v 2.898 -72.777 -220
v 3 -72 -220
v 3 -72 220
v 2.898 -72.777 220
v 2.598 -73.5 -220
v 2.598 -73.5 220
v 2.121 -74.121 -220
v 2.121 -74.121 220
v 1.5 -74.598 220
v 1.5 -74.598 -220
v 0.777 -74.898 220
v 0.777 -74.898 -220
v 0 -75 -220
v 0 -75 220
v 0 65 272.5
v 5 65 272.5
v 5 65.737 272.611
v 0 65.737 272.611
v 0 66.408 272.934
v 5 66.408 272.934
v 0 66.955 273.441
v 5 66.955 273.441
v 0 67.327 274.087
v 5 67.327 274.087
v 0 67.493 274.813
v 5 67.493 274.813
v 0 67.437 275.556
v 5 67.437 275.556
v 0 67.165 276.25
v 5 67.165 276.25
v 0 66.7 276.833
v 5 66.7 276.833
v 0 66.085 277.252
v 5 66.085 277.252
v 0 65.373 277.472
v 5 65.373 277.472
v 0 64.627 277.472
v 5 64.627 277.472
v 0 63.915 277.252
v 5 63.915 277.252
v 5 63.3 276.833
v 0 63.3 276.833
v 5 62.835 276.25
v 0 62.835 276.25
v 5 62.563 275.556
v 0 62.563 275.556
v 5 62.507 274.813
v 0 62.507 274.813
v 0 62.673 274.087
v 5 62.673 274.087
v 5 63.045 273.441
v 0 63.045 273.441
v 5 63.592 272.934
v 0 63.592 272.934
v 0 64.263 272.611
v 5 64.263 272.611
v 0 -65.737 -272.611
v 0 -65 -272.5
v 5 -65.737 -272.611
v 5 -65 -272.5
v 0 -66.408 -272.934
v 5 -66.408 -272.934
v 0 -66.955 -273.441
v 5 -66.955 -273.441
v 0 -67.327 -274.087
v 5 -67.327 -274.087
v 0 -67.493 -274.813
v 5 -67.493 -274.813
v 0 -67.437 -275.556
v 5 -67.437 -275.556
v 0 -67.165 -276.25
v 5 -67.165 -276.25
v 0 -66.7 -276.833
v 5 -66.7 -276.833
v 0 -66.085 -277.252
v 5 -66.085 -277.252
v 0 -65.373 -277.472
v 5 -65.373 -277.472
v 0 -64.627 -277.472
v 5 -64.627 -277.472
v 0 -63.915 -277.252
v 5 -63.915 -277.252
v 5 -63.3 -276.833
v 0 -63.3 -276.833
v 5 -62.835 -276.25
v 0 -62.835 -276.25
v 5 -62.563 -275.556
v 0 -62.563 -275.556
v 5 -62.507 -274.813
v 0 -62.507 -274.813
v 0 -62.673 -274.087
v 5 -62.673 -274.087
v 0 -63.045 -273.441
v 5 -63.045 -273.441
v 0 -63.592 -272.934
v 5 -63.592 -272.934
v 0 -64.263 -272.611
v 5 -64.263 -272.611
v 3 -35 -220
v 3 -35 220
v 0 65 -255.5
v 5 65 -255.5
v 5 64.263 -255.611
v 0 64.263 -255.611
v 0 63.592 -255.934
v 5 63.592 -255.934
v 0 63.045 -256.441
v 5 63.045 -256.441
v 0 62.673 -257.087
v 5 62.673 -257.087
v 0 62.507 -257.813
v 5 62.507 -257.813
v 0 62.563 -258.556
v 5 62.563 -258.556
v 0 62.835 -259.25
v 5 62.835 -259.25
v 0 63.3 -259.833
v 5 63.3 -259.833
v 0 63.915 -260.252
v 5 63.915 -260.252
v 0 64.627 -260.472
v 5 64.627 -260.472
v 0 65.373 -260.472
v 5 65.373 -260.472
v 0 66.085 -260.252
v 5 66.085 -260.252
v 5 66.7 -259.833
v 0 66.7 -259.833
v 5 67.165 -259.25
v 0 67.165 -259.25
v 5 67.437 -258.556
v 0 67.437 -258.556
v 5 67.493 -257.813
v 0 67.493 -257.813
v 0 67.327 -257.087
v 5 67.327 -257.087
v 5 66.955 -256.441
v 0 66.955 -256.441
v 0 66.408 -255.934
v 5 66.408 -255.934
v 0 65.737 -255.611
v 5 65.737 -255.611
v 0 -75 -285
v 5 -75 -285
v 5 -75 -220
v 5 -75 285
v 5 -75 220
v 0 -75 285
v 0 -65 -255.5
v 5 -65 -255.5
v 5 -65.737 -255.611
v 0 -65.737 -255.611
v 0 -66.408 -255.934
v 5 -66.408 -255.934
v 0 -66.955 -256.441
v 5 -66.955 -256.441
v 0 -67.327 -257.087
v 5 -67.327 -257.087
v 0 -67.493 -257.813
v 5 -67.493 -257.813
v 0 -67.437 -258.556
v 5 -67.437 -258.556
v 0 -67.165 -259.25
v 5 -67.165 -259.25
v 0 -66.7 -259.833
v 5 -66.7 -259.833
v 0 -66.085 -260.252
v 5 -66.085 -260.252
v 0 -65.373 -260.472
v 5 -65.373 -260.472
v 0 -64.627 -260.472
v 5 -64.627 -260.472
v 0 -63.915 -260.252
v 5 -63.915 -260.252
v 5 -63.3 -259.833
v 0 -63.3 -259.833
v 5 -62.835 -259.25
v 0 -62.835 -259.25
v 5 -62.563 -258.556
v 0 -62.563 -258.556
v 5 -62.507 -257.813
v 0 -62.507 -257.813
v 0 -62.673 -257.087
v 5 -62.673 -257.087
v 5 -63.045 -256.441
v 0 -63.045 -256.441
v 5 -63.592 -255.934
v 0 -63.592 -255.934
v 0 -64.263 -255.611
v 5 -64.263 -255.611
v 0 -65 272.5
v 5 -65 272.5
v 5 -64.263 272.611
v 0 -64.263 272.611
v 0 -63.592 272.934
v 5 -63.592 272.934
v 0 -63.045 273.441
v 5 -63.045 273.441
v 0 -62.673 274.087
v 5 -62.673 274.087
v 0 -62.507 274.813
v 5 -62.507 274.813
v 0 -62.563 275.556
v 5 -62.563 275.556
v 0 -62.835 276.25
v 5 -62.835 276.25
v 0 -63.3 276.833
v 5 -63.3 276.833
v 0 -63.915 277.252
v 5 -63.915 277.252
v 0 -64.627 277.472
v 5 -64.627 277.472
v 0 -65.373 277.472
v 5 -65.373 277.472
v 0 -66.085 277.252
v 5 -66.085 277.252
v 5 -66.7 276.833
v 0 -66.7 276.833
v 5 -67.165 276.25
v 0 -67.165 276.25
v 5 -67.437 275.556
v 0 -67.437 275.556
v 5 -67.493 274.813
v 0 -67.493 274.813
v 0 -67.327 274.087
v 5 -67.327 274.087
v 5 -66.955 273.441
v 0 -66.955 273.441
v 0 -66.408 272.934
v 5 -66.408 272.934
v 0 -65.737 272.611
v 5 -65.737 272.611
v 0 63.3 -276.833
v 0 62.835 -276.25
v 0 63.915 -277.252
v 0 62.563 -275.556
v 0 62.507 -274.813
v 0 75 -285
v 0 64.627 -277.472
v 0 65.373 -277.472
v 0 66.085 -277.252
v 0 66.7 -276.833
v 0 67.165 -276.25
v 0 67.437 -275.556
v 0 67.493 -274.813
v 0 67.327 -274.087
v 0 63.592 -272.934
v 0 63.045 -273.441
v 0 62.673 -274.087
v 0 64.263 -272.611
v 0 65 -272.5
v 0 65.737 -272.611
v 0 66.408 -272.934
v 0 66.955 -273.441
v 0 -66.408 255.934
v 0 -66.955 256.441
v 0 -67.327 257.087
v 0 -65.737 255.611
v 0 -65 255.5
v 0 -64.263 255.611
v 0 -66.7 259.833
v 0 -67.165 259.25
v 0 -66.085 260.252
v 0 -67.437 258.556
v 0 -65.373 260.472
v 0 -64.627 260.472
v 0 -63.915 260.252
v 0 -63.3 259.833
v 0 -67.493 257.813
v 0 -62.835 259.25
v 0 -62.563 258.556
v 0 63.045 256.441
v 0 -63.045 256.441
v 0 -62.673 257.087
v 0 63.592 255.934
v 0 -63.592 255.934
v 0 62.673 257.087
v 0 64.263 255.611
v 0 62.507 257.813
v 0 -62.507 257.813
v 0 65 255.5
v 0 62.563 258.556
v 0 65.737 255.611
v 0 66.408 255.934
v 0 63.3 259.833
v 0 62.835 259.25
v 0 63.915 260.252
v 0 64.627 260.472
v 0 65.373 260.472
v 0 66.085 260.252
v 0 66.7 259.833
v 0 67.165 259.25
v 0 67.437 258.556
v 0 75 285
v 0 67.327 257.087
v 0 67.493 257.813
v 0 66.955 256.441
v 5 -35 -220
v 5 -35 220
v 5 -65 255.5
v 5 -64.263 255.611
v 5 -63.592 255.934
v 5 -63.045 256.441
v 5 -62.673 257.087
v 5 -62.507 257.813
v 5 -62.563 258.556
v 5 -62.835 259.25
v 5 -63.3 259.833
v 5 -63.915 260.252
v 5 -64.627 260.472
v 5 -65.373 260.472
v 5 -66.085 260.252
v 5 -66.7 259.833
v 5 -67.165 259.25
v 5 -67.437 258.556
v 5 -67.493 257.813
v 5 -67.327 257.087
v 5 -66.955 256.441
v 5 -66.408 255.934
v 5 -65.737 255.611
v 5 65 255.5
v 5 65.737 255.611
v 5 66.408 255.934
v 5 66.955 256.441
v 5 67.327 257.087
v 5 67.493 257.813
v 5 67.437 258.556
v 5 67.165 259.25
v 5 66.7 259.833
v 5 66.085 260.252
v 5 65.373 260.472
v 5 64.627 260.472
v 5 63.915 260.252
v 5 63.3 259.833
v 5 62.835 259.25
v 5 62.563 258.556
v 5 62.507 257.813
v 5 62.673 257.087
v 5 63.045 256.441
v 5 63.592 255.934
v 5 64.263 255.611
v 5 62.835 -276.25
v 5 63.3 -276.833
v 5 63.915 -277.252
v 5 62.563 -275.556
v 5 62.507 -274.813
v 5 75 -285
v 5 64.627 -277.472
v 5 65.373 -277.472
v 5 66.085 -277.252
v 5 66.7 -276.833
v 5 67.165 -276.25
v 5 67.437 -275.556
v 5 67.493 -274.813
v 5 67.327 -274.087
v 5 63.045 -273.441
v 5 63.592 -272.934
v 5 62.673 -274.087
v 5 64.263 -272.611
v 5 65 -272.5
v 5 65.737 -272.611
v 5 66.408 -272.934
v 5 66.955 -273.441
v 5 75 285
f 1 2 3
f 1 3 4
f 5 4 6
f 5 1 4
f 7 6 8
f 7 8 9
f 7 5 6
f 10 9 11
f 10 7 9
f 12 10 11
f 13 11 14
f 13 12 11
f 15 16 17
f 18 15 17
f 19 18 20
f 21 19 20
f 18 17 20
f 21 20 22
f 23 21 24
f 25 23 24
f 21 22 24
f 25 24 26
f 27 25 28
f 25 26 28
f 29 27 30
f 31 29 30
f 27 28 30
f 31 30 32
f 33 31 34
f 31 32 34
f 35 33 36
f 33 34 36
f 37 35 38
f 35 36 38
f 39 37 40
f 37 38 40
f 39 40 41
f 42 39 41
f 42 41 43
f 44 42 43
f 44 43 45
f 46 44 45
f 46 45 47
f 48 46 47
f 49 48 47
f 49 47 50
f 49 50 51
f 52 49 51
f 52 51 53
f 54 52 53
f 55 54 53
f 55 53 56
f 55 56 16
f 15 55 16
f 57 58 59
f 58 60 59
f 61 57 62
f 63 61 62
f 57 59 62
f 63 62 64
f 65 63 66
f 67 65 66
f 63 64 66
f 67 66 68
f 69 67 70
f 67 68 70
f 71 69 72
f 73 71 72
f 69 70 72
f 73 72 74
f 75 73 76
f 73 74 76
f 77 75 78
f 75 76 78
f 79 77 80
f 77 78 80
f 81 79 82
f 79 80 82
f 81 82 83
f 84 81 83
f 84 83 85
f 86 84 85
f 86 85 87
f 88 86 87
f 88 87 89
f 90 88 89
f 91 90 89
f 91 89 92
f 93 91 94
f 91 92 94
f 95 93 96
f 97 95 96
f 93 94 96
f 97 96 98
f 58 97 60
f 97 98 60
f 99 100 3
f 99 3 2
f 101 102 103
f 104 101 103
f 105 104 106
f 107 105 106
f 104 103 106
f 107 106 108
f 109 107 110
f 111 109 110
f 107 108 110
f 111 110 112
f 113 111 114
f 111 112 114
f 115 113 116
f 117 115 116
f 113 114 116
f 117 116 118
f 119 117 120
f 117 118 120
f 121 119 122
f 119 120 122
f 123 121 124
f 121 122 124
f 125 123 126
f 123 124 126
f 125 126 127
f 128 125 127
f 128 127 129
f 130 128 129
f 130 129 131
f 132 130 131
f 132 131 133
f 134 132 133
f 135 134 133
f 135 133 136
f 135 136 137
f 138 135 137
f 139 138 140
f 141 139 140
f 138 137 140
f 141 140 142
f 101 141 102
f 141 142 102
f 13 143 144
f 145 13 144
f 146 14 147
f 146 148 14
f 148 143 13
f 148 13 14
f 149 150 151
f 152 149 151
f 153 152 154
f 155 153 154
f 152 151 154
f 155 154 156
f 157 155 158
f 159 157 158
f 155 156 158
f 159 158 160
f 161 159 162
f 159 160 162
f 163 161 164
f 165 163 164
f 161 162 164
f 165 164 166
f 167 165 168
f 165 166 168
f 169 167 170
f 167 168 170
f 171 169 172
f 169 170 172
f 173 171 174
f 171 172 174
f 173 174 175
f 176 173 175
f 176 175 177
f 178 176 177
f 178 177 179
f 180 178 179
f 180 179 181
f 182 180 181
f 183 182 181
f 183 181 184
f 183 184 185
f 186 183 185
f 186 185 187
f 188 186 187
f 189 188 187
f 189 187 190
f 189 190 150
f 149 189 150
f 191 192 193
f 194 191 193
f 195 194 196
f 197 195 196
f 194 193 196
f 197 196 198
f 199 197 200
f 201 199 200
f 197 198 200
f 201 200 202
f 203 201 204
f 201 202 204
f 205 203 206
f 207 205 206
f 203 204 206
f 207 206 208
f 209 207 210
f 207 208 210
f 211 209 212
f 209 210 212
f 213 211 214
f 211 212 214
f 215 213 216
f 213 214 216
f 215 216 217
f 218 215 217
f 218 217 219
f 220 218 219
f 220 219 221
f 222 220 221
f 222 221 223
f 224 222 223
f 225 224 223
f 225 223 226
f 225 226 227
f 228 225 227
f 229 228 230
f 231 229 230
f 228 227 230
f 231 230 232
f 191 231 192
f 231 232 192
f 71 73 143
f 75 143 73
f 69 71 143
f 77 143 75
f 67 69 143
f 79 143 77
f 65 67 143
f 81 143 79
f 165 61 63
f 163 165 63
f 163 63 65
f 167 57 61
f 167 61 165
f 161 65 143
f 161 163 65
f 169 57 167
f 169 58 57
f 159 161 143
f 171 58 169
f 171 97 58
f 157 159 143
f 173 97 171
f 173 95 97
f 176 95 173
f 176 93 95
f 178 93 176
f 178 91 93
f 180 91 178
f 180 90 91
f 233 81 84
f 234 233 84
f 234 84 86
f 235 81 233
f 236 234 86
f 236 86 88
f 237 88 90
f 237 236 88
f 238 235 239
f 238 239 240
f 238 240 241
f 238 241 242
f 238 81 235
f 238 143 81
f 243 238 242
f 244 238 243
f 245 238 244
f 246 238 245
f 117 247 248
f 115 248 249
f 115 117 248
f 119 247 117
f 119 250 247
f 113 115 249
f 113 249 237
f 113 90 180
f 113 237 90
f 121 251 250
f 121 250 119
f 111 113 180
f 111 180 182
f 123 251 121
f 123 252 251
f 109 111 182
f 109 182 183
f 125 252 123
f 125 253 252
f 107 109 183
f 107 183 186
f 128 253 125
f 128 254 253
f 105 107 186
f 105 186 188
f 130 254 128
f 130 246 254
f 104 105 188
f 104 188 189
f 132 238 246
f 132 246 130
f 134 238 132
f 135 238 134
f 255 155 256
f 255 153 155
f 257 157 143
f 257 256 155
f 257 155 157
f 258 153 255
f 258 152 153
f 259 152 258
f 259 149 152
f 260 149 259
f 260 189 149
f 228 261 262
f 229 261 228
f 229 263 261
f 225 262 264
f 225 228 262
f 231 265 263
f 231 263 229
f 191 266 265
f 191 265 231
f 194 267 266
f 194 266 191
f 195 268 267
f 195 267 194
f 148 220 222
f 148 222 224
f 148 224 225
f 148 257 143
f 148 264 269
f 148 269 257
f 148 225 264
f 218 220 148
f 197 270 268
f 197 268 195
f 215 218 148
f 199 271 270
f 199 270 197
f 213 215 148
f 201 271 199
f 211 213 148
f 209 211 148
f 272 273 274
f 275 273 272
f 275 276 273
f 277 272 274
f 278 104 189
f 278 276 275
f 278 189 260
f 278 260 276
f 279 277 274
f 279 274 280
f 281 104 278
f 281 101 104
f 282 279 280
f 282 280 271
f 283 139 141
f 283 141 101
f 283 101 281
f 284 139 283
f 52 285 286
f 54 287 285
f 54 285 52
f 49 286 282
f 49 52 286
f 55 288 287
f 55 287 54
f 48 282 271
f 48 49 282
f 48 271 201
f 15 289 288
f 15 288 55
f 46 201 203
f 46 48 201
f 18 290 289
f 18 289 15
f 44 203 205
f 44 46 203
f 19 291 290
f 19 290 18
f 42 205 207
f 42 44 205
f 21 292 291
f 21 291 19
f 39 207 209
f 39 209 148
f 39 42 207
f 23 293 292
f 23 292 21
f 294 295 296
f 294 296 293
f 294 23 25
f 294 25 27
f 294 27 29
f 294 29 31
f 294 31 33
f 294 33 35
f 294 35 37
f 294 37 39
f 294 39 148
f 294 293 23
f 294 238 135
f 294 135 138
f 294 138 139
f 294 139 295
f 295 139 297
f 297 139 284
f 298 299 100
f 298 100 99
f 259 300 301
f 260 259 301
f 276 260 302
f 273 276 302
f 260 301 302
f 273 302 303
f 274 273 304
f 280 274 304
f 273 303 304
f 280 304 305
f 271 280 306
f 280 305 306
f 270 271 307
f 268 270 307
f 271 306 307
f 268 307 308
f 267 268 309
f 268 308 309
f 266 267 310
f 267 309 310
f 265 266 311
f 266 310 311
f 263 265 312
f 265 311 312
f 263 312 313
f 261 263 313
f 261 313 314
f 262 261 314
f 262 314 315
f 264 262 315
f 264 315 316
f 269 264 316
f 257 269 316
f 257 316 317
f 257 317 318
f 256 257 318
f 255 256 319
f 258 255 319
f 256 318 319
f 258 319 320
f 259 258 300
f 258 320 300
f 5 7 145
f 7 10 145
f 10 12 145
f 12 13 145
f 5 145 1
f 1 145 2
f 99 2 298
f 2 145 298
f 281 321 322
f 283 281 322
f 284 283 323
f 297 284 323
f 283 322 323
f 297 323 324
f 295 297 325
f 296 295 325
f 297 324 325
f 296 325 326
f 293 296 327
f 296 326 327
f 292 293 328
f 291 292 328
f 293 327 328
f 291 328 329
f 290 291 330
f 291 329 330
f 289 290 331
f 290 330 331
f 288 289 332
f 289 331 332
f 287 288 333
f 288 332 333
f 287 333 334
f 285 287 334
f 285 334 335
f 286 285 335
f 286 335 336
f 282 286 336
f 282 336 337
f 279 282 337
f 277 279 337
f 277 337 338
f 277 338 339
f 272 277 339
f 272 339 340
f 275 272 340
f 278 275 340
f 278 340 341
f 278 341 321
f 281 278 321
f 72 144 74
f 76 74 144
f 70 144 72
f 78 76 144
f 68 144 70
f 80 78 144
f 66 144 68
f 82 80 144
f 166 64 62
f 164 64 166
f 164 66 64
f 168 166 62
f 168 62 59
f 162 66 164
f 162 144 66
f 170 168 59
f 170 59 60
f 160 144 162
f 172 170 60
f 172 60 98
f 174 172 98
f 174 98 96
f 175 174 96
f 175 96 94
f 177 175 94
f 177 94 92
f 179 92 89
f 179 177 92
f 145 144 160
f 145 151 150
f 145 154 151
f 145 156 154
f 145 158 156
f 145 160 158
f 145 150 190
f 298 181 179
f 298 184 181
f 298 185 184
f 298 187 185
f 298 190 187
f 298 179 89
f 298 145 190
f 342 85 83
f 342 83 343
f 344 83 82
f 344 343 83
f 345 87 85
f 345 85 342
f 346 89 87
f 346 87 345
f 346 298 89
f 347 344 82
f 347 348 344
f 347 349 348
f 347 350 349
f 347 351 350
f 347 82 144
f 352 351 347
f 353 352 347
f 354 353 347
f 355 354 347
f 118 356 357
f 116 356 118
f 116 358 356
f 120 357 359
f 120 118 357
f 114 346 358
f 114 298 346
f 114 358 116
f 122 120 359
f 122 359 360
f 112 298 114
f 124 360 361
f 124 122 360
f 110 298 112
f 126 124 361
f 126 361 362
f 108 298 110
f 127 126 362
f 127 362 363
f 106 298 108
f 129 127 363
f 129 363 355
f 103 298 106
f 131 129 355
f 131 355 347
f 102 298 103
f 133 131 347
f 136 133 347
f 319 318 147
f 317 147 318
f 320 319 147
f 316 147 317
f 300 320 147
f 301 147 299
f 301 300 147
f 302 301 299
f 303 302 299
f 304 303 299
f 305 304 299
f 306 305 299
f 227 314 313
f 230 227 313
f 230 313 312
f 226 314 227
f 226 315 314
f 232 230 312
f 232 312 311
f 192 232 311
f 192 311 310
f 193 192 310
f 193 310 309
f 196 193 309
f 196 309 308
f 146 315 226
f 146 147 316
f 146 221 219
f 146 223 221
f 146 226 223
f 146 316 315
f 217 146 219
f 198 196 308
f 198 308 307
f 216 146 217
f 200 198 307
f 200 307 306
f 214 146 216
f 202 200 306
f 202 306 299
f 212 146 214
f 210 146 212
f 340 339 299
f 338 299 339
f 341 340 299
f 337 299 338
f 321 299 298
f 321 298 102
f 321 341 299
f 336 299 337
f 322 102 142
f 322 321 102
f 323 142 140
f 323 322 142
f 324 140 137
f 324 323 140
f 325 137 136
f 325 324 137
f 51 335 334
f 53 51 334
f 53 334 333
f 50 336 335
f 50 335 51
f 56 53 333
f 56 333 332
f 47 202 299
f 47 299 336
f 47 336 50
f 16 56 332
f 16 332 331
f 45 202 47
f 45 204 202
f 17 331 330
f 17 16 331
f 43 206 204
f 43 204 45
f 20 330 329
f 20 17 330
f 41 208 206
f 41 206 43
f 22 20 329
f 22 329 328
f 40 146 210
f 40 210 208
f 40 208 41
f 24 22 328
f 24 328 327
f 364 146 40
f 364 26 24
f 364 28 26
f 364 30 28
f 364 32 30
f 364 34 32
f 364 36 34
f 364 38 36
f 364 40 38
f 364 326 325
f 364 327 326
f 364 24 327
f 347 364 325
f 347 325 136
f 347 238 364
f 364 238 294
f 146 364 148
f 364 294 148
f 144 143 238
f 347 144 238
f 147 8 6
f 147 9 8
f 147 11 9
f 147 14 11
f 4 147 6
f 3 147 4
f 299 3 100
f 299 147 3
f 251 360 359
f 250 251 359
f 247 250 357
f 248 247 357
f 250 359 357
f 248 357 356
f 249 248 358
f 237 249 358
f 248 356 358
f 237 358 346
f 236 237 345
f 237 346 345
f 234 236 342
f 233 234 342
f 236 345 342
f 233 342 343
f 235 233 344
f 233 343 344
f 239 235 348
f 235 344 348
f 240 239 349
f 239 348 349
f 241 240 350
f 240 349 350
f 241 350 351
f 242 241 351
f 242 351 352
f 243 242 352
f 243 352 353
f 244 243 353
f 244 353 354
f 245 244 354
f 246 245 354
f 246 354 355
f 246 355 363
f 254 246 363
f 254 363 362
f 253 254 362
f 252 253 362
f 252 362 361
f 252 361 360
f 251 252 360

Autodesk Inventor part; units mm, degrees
ref_plane "YZ Plane" through (0, 0, 0) normal (1, 0, 0) x (0, 1, 0)
ref_plane "XZ Plane" through (0, 0, 0) normal (0, 1, 0) x (-1, 0, 0)
ref_plane "XY Plane" through (0, 0, 0) normal (0, 0, 1) x (1, 0, 0)
sketch "Sketch1" plane through (0, 0, 0) normal (1, 0, 0) x (0, 1, 0)
  line L0 (75, 285) -> (-75, 285)
  line L1 (-75, 285) -> (-75, -285)
  line L2 (-75, -285) -> (75, -285)
  line L3 (75, -285) -> (75, 285)
  line L4 (75, 285) -> (-75, -285) construction
  line L5 (-75, 285) -> (75, -285) construction
  point P0 (0, 0)
  dimension "d0" = 150
  dimension "d1" = 570
extrude "Plate1" add sketch "Sketch1" along normal blind 5
sketch "Sketch2" plane through (5, 0, 0) normal (1, 0, 0) x (0, 0, -1)
  line L0 (-285, 75) -> (-285, -75) projected
  line L1 (-285, -75) -> (-285, -35)
  line L2 (-285, -75) -> (285, -75) projected
  line L3 (0, -75) -> (-220, -75)
  line L4 (0, -75) -> (220, -75)
  line L5 (220, -75) -> (220, -35)
  line L6 (220, -35) -> (0, -35)
  line L7 (0, -35) -> (0, -75)
  line L8 (0, -75) -> (-220, -75)
  line L9 (-220, -75) -> (-220, -35)
  line L10 (-220, -35) -> (0, -35)
  line L11 (0, -35) -> (0, -75)
  point P0 (0, 0)
  dimension "d3" = 40
  dimension "d4" = 220
  dimension "d5" = 220
  dimension "d6" = 40
  dimension "d7" = 220
  dimension "d8" = 40
extrude "Cut1" cut sketch "Sketch2" against normal blind 5
sketch "Sketch3" plane through (5, -35, -220) normal (0, -1, 0) x (1, 0, 0)
  line L0 (0, 440) -> (0, 0) projected
  line L1 (0, 440) -> (-5, 440) projected
  line L2 (-5, 0) -> (-5, 440) projected
  line L3 (0, 0) -> (-5, 0) projected
  line L4 (-5, 0) -> (-5, 440) projected
  line L5 (-5, 440) -> (-2, 440)
  line L6 (-2, 440) -> (-2, 0)
  line L7 (-2, 0) -> (-5, 0)
  line L8 (-5, 0) -> (-5, 440)
  point P0 (-5, 220)
  dimension "d11" = 3
  dimension "d12" = 440
extrude "Extrusion1" add sketch "Sketch3" along normal blind 40 contours L6 L3 L2 L1
fillet "Fillet1" radius 3 1 edges at (3, -75, 0)
sketch "Sketch4" plane through (5, 0, 0) normal (1, 0, 0) x (0, 0, -1)
  line L0 (-285, -75) -> (-285, 75) projected
  line L1 (-220, -75) -> (-285, -75) projected
  circle A0 centre (-275, -65) radius 2.5
  circle A1 centre (-258, -65) radius 2.5
  line L2 (-285, 0) -> (-275, 0)
  circle A2 centre (-275, 65) radius 2.5
  circle A3 centre (-258, 65) radius 2.5
  point P0 (0, 0)
  dimension "d16" = 10
  dimension "d17" = 10
  dimension "d18" = 5
  dimension "d19" = 17
  dimension "d20" = 5
extrude "Extrusion2" cut sketch "Sketch4" against normal mid plane 40
mirror "Mirror1" about plane through (0, 0, 0) normal (0, 0, 1) of "Extrusion2"
equation "\"d9\" = Thickness"
equation "\"d2\" = Thickness"
equation "\"BendRadius\" = Thickness"
equation "\"BendReliefWidth\" = Thickness"
equation "\"BendReliefDepth\" = 0.5 * Thickness"
equation "\"TransitionRadius\" = BendRadius"
equation "\"JacobiRadiusSize\" = BendRadius"
equation "\"GapSize\" = Thickness"
equation "\"Thickness\" = 5"
properties part number "elevatotr"
